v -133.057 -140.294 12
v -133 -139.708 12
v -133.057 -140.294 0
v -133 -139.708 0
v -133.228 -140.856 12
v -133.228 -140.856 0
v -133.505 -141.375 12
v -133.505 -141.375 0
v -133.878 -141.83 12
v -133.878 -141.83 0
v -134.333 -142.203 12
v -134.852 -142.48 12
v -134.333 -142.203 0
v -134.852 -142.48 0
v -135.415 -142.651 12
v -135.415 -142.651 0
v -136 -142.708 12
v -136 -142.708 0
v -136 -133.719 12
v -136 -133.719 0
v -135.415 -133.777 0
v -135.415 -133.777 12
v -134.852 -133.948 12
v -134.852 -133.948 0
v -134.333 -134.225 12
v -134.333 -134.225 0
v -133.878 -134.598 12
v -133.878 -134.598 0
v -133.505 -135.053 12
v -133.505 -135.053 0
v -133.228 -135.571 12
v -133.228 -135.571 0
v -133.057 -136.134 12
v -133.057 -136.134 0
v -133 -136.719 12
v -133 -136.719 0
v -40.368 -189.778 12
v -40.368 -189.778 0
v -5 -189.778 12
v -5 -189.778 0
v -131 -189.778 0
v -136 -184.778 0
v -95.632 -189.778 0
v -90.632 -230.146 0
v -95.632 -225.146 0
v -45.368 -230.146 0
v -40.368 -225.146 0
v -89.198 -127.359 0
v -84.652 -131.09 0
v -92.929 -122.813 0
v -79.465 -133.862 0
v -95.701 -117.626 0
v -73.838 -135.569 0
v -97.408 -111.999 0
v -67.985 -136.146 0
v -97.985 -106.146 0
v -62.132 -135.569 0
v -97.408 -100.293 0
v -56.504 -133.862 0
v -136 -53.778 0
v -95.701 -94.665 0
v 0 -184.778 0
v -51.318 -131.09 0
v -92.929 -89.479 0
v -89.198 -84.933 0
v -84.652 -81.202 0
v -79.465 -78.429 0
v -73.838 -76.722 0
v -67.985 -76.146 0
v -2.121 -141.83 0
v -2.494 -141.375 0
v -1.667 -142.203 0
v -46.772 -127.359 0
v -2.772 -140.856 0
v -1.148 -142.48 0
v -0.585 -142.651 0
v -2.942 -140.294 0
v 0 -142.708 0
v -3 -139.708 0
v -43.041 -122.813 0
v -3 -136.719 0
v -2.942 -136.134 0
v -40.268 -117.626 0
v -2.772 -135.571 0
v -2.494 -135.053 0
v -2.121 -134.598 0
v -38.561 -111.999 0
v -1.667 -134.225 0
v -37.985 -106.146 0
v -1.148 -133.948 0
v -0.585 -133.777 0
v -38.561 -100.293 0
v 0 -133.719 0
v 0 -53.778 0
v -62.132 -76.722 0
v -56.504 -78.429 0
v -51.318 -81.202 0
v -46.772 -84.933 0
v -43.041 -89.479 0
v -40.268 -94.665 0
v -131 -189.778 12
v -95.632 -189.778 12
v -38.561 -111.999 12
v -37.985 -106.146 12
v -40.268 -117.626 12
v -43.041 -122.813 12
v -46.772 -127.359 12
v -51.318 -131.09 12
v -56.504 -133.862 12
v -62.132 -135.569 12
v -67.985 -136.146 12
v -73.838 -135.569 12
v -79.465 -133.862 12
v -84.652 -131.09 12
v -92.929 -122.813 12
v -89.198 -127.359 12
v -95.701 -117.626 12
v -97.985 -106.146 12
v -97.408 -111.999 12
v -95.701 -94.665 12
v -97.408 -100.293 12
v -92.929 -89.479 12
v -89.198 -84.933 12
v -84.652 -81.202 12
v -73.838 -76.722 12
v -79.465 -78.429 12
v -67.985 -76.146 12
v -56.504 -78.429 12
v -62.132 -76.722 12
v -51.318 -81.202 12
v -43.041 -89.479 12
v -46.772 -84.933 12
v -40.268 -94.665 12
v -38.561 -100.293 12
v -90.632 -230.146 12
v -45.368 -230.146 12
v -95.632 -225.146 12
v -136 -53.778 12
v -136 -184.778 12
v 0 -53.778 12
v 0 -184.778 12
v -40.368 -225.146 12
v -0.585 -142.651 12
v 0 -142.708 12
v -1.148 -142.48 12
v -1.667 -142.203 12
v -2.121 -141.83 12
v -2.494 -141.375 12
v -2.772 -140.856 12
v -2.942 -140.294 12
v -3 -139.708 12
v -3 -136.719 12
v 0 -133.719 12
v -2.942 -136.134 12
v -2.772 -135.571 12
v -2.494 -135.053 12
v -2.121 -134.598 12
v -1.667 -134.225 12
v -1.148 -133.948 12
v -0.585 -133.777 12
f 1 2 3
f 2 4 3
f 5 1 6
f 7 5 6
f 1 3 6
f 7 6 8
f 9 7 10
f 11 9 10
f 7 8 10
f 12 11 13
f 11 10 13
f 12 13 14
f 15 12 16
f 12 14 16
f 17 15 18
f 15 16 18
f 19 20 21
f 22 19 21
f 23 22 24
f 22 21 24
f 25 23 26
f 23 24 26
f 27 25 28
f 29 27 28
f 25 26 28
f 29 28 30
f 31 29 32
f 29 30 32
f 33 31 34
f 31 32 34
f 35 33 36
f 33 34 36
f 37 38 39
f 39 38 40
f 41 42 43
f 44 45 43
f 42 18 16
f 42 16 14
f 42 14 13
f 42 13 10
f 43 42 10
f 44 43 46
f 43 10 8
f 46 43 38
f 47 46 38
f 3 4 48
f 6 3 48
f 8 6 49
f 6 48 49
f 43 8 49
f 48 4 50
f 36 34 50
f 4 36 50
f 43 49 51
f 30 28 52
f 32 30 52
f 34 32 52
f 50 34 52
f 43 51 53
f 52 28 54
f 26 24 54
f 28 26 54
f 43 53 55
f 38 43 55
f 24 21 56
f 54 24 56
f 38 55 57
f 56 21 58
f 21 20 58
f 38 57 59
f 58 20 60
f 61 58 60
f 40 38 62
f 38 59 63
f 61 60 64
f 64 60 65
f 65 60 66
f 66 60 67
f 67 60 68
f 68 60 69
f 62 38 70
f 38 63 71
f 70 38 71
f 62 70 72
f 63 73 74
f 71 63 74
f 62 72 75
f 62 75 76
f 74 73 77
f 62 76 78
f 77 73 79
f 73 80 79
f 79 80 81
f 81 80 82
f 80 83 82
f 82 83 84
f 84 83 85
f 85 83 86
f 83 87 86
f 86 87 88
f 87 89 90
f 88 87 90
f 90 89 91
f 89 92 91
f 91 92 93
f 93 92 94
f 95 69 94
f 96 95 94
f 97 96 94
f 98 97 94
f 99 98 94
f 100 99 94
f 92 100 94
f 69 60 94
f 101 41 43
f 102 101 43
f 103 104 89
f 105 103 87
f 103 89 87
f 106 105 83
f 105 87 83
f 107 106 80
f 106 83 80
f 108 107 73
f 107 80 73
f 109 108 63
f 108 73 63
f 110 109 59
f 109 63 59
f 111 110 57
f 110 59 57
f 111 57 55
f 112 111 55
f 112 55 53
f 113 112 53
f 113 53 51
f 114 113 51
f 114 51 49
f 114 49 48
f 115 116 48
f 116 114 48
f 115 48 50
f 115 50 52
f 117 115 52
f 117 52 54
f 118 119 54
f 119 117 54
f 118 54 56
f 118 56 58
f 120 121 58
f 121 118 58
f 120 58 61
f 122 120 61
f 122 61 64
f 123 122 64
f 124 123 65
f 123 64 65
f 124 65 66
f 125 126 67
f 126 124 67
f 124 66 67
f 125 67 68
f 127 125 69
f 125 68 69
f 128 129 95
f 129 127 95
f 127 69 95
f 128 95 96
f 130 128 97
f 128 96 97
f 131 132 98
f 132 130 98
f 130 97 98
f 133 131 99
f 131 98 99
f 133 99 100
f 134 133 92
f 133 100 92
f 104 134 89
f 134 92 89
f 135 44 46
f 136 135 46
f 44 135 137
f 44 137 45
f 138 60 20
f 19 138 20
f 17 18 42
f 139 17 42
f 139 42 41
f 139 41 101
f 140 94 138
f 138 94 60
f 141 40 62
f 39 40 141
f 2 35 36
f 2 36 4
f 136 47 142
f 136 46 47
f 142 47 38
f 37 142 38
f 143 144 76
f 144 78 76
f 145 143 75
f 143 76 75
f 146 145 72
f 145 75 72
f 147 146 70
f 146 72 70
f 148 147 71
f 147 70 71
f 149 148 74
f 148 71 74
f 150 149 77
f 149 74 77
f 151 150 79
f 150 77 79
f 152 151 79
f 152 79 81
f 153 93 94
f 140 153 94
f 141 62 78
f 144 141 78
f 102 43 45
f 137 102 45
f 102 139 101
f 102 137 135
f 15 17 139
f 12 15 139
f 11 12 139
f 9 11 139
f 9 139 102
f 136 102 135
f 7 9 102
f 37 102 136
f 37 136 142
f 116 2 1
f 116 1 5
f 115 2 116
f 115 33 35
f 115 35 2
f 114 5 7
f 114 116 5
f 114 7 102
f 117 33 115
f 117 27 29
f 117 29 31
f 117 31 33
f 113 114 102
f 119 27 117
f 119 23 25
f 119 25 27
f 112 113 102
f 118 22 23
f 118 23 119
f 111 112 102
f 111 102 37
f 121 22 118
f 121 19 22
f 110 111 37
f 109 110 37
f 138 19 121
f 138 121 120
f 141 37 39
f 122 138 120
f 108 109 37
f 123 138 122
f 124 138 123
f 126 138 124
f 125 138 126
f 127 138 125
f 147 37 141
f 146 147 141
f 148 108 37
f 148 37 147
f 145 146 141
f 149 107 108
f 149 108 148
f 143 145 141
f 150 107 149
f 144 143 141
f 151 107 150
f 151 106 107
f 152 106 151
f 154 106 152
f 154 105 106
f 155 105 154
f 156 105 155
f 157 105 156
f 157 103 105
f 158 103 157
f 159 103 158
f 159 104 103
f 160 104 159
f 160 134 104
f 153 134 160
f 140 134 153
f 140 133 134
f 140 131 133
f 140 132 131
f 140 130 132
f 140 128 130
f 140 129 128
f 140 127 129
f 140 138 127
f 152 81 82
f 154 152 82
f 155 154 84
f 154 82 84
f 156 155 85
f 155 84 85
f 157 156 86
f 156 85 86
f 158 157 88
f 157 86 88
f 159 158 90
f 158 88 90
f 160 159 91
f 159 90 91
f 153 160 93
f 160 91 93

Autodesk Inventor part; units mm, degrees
ref_plane "YZ Plane" through (0, 0, 0) normal (1, 0, 0) x (0, 1, 0)
ref_plane "XZ Plane" through (0, 0, 0) normal (0, 1, 0) x (-1, 0, 0)
ref_plane "XY Plane" through (0, 0, 0) normal (0, 0, 1) x (1, 0, 0)
ref_plane "Work Plane1" through (0, 0, 0) normal (0, 0, 1) x (1, 0, 0)
sketch "Sketch1" plane through (0, 0, 0) normal (0, 0, 1) x (1, 0, 0)
  circle A0 centre (-67.9848, -106.1458) radius 30 projected
  line L0 (0, -139.7083) -> (0, -24) projected
  line L1 (-95.6323, -230.1458) -> (-40.3675, -230.1458)
  line L2 (-40.3675, -230.1458) -> (-40.3675, -106.1458)
  line L3 (-40.3675, -106.1458) -> (-95.6323, -106.1458)
  line L4 (-95.6323, -106.1458) -> (-95.6323, -230.1458)
  line L5 (-135.9998, -189.7783) -> (0, -189.7783)
  line L6 (0, -189.7783) -> (0, -53.7785)
  line L7 (0, -53.7785) -> (-135.9998, -53.7785)
  line L8 (-135.9998, -53.7785) -> (-135.9998, -189.7783)
  line L9 (-147.9998, -163.7083) -> (-135.9998, -163.7083) projected
  line L10 (-135.9998, -189.7783) -> (-135.9998, -163.7083) projected
  line L11 (-135.9998, -189.7783) -> (-147.9998, -189.7783) projected
  line L12 (-147.9998, -189.7783) -> (-147.9998, -163.7083) projected
  point P0 (0, 0)
  point P1 (-40.3675, -230.1458)
  point P2 (0, -189.7783)
  point P3 (-40.3675, -189.7783)
  point P4 (-95.6323, -189.7783)
extrude "Extrusion1" add sketch "Sketch1" along normal blind 12 contours A0 L4 L5 L8 L7 L0 L6 L2 | A0 L2 L5 L4 | L5 L2 L1 L4
chamfer "Chamfer1" distance 5 angle 45 4 edges at (-135.9998, -189.7783, 6) (-95.6323, -230.1458, 6) (-40.3675, -230.1458, 6) (0, -189.7783, 6)
sketch "Sketch4" plane through (0, 0, 0) normal (0, 0, -1) x (-1, 0, 0)
  line L0 (135.9998, -163.7083) -> (135.9998, -139.7083) projected
  line L1 (135.9998, -136.7194) -> (135.9998, 252.4278) projected
  line L2 (135.9998, -136.7194) -> (135.9998, -139.7083) construction
  line L3 (135.9998, -53.7785) -> (135.9998, -184.7783) projected
  line L4 (132.9998, -136.7194) -> (132.9998, -139.7083)
  line L5 (138.9998, -139.7083) -> (138.9998, -136.7194)
  arc A0 (138.9998, -136.7194) -> (132.9998, -136.7194) centre (135.9998, -136.7194) ccw
  arc A1 (132.9998, -139.7083) -> (138.9998, -139.7083) centre (135.9998, -139.7083) ccw
  point P0 (0, 0)
  point P1 (135.9998, -138.2139)
  point P2 (135.9998, -142.7083)
  point P3 (135.9998, -133.7194)
  dimension "d6" = 6
extrude "Extrusion2" cut sketch "Sketch4" against normal through all contours A1 L4 A0 L1 L3 L0
ref_plane "Work Plane2" through (-147.9998, 57.8542, 0) normal (-1, 0, 0) x (0, -1, 0)
ref_plane "Work Plane3" through (-67.9999, -53.7785, 12) normal (1, 0, 0) x (0, 0, -1)
mirror "Mirror1" about plane through (-67.9999, -53.7785, 12) normal (1, 0, 0) of "Extrusion2"
sketch "Sketch7" plane through (0, 0, 12) normal (0, 0, 1) x (1, 0, 0)
  circle A0 centre (-67.9848, -106.1458) radius 30 projected
  arc A1 (-3, -139.7083) -> (0, -142.7083) centre (0, -139.7083) ccw projected
  line L0 (-3, -139.7083) -> (-3, -136.7194) projected
  arc A2 (0, -133.7194) -> (-3, -136.7194) centre (0, -136.7194) ccw projected
  line L1 (0, -133.7194) -> (0, -53.7785) projected
  line L2 (0, -53.7785) -> (-135.9998, -53.7785) projected
  line L3 (-135.9998, -53.7785) -> (-135.9998, -133.7194) projected
  arc A3 (-132.9998, -136.7194) -> (-135.9998, -133.7194) centre (-135.9998, -136.7194) ccw projected
  line L4 (-132.9998, -136.7194) -> (-132.9998, -139.7083) projected
  arc A4 (-135.9998, -142.7083) -> (-132.9998, -139.7083) centre (-135.9998, -139.7083) ccw projected
  line L5 (-135.9998, -142.7083) -> (-135.9998, -184.7783) projected
  line L6 (-130.9998, -189.7783) -> (-135.9998, -184.7783) projected
  line L7 (-130.9998, -189.7783) -> (-95.6323, -189.7783) projected
  line L8 (-95.6323, -189.7783) -> (-95.6323, -225.1458) projected
  line L9 (-90.6323, -230.1458) -> (-95.6323, -225.1458) projected
  line L10 (-90.6323, -230.1458) -> (-45.3675, -230.1458) projected
  line L11 (-40.3675, -225.1458) -> (-45.3675, -230.1458) projected
  line L12 (-40.3675, -225.1458) -> (-40.3675, -189.7783) projected
  line L13 (-40.3675, -189.7783) -> (-5, -189.7783) projected
  line L14 (0, -184.7783) -> (-5, -189.7783) projected
  line L15 (0, -184.7783) -> (0, -142.7083) projected
  point P0 (0, 0)
properties part number "internal"
